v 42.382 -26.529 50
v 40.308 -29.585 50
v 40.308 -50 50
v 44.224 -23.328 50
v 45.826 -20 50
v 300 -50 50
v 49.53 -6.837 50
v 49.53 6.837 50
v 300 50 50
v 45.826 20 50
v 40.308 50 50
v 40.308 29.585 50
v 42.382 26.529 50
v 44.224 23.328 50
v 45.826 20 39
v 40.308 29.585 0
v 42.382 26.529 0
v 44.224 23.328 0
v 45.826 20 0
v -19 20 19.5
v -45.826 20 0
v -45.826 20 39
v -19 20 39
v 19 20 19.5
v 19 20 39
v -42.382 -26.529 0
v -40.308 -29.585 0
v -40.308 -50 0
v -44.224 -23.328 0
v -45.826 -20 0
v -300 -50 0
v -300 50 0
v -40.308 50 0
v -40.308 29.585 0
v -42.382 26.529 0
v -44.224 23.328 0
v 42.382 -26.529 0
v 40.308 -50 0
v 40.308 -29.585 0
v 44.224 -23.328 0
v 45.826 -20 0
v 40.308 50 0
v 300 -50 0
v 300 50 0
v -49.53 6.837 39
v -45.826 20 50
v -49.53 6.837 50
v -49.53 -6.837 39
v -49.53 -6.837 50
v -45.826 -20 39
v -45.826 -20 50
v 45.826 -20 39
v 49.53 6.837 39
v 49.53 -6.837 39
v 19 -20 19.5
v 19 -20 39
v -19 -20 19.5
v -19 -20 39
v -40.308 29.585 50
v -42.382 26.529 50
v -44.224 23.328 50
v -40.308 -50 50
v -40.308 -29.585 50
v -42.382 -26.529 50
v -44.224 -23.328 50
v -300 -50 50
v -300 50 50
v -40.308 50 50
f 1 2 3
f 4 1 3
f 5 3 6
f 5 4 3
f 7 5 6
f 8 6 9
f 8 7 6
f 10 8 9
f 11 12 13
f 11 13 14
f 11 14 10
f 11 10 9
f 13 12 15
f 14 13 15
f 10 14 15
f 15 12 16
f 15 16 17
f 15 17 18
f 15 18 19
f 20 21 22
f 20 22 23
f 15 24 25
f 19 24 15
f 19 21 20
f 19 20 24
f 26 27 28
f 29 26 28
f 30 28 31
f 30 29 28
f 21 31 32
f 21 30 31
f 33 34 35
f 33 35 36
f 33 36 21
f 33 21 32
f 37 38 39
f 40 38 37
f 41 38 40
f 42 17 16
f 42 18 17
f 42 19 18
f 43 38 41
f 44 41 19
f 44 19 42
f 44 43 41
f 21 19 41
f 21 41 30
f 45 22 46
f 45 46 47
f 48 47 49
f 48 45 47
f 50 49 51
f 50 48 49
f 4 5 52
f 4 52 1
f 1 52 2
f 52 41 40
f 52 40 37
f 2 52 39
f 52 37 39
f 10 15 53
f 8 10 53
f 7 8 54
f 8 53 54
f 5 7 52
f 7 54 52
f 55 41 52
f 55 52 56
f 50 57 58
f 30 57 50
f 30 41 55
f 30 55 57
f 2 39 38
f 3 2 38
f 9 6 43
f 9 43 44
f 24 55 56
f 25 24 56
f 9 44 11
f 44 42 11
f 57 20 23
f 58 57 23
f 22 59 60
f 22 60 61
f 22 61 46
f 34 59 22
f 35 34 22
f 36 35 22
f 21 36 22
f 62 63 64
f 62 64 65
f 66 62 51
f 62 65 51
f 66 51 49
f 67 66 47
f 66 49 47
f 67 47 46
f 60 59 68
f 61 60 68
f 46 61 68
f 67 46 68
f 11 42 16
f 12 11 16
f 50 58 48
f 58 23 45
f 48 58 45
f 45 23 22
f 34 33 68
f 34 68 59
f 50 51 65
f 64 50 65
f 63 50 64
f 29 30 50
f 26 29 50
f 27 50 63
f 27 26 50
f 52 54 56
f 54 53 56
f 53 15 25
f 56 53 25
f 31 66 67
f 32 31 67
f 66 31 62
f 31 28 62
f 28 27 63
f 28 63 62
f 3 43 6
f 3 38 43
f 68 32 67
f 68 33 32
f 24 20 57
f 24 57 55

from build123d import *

# Parameters (mm, degrees)
F1_DEPTH = 39
F2_DEPTH = 50
F3_W     = 100
F3_H     = 50
F4_DEPTH = 150
F6_W     = 20
F6_H     = 19.5
F7_DEPTH = 76.8
F8_W     = 9
F8_H     = 19.5
F9_DEPTH = 617


with BuildPart() as f1:
    # F0 (on Top) → F1 (new body)
    with BuildSketch(Plane.XY):
        with BuildLine():
            ThreePointArc((45.8257569496, -20), (50, 0), (45.8257569496, 20))
            Line((45.8257569496, 20), (0, 20))
            Line((0, 20), (0, -20))
            Line((0, -20), (45.8257569496, -20))
        make_face()
    extrude(amount=F1_DEPTH)

    # F0 (on Top) → F2 (join)
    with BuildSketch(Plane.XY):
        with BuildLine():
            Line((150, -50), (150, 50))
            Line((150, 50), (40.307905525, 50))
            Line((40.307905525, 50), (40.307905525, 29.5850089098))
            ThreePointArc((40.307905525, 29.5850089098), (43.3326672589, 24.945539646), (45.8257569496, 20))
            ThreePointArc((45.8257569496, 20), (50, 0), (45.8257569496, -20))
            ThreePointArc((45.8257569496, -20), (43.3326672589, -24.945539646), (40.307905525, -29.5850089098))
            Line((40.307905525, -29.5850089098), (40.307905525, -50))
            Line((40.307905525, -50), (150, -50))
        make_face()
    extrude(amount=F2_DEPTH)

    # F3 (on face) → F4 (join)
    with BuildSketch(Plane.YZ.offset(150)):
        with Locations((0, 25)):
            Rectangle(F3_W, F3_H)
    extrude(amount=F4_DEPTH)

    # F5: F1 across plane


with BuildPart() as f1_1:
    add(f1.part)
    add(f1.part.mirror(Plane.YZ))

    # F6 (on Front) → F7 (cut, symmetric)
    with BuildSketch(Plane.XZ):
        with Locations((0, 29.25)):
            Rectangle(F6_W, F6_H)
    extrude(amount=F7_DEPTH, both=True, mode=Mode.SUBTRACT)

    # F8 (on face) → F9 (cut, symmetric)
    with BuildSketch(Plane.XZ.offset(20)):
        with Locations((14.5, 29.25)):
            Rectangle(F8_W, F8_H)
        with Locations((-14.5, 29.25)):
            Rectangle(F8_W, F8_H)
    extrude(amount=F9_DEPTH, both=True, mode=Mode.SUBTRACT)


solid = f1_1.part
